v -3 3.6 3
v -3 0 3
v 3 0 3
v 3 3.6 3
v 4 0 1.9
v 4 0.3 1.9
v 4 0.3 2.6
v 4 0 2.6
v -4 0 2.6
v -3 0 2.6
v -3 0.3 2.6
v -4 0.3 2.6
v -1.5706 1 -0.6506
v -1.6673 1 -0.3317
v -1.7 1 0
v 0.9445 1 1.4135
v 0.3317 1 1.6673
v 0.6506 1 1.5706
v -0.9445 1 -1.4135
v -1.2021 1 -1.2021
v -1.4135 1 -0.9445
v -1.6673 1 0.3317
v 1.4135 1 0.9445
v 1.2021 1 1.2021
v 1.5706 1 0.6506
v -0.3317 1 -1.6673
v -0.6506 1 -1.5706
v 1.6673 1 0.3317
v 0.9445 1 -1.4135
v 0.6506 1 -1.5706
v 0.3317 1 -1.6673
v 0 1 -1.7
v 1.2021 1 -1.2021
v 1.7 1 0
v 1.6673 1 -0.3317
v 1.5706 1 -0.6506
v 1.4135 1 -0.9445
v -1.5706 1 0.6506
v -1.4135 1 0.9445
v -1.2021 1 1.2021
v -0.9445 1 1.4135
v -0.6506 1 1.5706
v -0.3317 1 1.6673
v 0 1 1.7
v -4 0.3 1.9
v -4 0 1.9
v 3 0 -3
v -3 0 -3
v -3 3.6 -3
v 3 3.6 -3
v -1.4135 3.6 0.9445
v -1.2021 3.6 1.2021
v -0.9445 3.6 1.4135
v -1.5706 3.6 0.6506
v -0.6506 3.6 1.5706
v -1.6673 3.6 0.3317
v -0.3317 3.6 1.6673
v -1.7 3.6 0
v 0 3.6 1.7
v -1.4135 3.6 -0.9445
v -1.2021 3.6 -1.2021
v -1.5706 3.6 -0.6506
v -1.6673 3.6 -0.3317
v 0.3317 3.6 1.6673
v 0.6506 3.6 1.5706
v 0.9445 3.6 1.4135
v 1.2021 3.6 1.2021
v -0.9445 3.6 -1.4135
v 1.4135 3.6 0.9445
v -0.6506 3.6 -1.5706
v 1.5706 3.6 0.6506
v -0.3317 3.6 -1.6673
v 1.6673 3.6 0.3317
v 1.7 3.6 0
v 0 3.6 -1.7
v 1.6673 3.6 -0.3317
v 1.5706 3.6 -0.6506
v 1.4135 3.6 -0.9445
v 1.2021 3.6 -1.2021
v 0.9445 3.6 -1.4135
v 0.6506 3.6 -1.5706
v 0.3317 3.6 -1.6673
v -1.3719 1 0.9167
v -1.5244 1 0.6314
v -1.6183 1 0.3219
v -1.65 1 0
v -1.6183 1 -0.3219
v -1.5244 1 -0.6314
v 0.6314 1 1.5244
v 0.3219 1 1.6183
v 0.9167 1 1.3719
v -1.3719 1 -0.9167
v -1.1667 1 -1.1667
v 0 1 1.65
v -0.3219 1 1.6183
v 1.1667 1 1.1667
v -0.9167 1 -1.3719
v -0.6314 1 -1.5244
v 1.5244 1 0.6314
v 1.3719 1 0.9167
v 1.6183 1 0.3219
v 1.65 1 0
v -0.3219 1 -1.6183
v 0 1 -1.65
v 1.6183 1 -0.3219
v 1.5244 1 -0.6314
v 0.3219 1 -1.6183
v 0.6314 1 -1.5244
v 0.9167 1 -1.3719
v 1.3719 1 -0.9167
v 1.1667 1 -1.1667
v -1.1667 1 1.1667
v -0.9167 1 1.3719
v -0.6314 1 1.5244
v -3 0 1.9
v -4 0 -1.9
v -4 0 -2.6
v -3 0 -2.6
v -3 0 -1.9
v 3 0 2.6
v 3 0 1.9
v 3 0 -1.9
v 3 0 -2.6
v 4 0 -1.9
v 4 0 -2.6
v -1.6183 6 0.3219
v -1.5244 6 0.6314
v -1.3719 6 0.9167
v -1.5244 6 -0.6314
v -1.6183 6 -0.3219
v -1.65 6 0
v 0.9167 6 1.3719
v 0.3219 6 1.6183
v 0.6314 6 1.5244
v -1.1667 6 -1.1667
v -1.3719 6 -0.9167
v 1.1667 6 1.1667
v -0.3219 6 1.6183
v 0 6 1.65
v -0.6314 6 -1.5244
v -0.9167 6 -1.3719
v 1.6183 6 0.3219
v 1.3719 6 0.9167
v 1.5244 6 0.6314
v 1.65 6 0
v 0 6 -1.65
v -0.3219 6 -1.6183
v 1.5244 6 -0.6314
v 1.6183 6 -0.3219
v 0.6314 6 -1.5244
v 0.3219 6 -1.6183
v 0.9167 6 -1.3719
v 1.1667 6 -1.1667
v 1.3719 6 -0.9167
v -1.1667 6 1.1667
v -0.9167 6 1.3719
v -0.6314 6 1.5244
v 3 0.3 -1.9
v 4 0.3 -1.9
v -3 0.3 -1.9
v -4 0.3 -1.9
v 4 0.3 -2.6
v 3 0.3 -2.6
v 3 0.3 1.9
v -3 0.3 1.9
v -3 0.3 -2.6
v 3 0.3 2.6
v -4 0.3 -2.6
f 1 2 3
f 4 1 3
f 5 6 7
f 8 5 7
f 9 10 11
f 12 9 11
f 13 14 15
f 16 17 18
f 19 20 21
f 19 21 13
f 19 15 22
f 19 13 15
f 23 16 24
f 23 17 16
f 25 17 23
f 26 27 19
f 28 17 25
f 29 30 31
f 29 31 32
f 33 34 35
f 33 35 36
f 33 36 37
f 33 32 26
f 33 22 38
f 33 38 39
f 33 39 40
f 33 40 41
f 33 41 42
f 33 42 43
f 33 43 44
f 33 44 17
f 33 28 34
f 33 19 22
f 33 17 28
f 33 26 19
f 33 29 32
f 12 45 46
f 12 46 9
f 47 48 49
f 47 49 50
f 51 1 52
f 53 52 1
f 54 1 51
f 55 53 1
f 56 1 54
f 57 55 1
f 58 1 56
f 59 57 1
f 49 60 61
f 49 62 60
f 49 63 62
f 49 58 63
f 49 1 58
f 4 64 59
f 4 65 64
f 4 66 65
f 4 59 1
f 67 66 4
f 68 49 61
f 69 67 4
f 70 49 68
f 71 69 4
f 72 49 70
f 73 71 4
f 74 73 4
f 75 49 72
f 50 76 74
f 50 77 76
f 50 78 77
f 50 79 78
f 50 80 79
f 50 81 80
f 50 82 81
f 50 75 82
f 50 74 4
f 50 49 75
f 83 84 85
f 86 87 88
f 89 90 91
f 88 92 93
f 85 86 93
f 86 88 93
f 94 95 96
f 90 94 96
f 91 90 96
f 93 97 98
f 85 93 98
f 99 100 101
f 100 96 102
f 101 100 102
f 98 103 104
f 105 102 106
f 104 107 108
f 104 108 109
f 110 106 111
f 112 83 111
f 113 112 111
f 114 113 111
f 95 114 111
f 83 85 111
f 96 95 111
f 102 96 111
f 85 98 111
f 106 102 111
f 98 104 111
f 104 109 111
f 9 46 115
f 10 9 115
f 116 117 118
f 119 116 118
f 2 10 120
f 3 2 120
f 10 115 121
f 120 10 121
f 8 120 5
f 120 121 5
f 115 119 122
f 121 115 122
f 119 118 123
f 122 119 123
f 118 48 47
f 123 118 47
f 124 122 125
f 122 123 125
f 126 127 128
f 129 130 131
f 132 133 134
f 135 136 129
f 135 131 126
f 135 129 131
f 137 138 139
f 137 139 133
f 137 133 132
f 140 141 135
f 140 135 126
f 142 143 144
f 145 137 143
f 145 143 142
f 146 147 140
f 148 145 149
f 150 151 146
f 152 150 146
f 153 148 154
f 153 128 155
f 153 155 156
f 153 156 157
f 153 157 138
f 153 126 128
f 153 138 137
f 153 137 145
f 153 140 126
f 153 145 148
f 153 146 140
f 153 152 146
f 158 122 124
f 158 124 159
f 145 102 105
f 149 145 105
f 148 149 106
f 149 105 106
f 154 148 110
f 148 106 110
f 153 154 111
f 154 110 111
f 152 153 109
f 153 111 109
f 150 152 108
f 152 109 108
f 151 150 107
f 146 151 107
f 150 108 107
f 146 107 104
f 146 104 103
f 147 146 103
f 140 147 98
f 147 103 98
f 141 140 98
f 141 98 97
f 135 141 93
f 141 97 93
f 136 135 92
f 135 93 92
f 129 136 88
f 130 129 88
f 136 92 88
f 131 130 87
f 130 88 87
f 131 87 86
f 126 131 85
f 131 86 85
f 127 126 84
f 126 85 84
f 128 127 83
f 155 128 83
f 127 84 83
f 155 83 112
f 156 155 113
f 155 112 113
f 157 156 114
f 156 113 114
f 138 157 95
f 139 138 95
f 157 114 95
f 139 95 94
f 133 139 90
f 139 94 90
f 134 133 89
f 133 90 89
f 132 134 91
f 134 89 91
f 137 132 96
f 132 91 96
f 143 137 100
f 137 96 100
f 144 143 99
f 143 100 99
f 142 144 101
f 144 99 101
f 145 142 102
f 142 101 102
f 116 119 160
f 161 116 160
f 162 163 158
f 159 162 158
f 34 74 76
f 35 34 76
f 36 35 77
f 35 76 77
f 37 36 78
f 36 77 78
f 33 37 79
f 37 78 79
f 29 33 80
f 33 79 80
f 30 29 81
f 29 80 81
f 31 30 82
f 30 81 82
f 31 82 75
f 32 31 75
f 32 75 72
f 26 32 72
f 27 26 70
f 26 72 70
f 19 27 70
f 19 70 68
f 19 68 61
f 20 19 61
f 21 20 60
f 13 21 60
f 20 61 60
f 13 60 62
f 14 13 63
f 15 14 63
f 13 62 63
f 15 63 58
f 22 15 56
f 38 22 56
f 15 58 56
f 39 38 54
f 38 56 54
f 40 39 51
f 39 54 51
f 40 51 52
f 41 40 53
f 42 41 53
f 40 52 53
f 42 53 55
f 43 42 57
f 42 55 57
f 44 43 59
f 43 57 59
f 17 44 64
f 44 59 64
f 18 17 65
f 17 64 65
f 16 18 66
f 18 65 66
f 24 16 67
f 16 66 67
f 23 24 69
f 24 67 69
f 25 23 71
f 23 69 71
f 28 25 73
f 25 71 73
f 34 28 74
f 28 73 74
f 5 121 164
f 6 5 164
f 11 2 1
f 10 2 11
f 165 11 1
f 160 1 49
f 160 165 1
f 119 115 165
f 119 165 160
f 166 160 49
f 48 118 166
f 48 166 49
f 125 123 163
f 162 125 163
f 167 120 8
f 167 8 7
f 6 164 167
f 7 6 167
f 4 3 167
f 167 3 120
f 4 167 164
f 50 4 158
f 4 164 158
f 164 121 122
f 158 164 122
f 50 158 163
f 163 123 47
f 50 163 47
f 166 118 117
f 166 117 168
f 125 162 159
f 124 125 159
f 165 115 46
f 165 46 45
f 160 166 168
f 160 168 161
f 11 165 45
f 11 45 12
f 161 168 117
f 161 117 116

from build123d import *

# Parameters (mm, degrees)
SKETCH_1_W          = 6
SKETCH_1_H          = 6
EXTRUDE_1_DEPTH     = 3.6
SKETCH_2_W          = 0.7
SKETCH_2_H          = 0.3
EXTRUDE_2_DEPTH     = 1
SKETCH_3_R          = 1.7
CUT_EXTRUDE_1_DEPTH = 2.6
SKETCH_4_R          = 1.65
EXTRUDE_3_DEPTH     = 5


with BuildPart() as part:
    # 草图1 → 凸台-拉伸1 (new body)
    with BuildSketch(Plane(origin=(0, 0, 0), x_dir=(1, 0, 0), z_dir=(0, 1, 0))):
        Rectangle(SKETCH_1_W, SKETCH_1_H)
    extrude(amount=EXTRUDE_1_DEPTH)

    # 草图2 → 凸台-拉伸2 (add)
    with BuildSketch(Plane.ZY.offset(3)):
        with Locations((-2.25, 0.15)):
            Rectangle(SKETCH_2_W, SKETCH_2_H)
        with Locations((2.25, 0.15)):
            Rectangle(SKETCH_2_W, SKETCH_2_H)
    extrude_2 = extrude(amount=EXTRUDE_2_DEPTH)

    # 镜向1: 凸台-拉伸2 across plane
    add(extrude_2.mirror(Plane(origin=(0, 0, 0), x_dir=(0, 0, 1), z_dir=(1, 0, 0))))

    # 草图3 → 切除-拉伸1 (cut)
    with BuildSketch(Plane(origin=(0, 3.6, 0), x_dir=(1, 0, 0), z_dir=(0, 1, 0))):
        Circle(SKETCH_3_R)
    extrude(amount=-CUT_EXTRUDE_1_DEPTH, mode=Mode.SUBTRACT)


with BuildPart() as body_2:
    # 草图4 → 凸台-拉伸3 (new body)
    with BuildSketch(Plane(origin=(0, 1, 0), x_dir=(1, 0, 0), z_dir=(0, 1, 0))):
        Circle(SKETCH_4_R)
    extrude(amount=EXTRUDE_3_DEPTH)


solid = Compound([part.part, body_2.part])
